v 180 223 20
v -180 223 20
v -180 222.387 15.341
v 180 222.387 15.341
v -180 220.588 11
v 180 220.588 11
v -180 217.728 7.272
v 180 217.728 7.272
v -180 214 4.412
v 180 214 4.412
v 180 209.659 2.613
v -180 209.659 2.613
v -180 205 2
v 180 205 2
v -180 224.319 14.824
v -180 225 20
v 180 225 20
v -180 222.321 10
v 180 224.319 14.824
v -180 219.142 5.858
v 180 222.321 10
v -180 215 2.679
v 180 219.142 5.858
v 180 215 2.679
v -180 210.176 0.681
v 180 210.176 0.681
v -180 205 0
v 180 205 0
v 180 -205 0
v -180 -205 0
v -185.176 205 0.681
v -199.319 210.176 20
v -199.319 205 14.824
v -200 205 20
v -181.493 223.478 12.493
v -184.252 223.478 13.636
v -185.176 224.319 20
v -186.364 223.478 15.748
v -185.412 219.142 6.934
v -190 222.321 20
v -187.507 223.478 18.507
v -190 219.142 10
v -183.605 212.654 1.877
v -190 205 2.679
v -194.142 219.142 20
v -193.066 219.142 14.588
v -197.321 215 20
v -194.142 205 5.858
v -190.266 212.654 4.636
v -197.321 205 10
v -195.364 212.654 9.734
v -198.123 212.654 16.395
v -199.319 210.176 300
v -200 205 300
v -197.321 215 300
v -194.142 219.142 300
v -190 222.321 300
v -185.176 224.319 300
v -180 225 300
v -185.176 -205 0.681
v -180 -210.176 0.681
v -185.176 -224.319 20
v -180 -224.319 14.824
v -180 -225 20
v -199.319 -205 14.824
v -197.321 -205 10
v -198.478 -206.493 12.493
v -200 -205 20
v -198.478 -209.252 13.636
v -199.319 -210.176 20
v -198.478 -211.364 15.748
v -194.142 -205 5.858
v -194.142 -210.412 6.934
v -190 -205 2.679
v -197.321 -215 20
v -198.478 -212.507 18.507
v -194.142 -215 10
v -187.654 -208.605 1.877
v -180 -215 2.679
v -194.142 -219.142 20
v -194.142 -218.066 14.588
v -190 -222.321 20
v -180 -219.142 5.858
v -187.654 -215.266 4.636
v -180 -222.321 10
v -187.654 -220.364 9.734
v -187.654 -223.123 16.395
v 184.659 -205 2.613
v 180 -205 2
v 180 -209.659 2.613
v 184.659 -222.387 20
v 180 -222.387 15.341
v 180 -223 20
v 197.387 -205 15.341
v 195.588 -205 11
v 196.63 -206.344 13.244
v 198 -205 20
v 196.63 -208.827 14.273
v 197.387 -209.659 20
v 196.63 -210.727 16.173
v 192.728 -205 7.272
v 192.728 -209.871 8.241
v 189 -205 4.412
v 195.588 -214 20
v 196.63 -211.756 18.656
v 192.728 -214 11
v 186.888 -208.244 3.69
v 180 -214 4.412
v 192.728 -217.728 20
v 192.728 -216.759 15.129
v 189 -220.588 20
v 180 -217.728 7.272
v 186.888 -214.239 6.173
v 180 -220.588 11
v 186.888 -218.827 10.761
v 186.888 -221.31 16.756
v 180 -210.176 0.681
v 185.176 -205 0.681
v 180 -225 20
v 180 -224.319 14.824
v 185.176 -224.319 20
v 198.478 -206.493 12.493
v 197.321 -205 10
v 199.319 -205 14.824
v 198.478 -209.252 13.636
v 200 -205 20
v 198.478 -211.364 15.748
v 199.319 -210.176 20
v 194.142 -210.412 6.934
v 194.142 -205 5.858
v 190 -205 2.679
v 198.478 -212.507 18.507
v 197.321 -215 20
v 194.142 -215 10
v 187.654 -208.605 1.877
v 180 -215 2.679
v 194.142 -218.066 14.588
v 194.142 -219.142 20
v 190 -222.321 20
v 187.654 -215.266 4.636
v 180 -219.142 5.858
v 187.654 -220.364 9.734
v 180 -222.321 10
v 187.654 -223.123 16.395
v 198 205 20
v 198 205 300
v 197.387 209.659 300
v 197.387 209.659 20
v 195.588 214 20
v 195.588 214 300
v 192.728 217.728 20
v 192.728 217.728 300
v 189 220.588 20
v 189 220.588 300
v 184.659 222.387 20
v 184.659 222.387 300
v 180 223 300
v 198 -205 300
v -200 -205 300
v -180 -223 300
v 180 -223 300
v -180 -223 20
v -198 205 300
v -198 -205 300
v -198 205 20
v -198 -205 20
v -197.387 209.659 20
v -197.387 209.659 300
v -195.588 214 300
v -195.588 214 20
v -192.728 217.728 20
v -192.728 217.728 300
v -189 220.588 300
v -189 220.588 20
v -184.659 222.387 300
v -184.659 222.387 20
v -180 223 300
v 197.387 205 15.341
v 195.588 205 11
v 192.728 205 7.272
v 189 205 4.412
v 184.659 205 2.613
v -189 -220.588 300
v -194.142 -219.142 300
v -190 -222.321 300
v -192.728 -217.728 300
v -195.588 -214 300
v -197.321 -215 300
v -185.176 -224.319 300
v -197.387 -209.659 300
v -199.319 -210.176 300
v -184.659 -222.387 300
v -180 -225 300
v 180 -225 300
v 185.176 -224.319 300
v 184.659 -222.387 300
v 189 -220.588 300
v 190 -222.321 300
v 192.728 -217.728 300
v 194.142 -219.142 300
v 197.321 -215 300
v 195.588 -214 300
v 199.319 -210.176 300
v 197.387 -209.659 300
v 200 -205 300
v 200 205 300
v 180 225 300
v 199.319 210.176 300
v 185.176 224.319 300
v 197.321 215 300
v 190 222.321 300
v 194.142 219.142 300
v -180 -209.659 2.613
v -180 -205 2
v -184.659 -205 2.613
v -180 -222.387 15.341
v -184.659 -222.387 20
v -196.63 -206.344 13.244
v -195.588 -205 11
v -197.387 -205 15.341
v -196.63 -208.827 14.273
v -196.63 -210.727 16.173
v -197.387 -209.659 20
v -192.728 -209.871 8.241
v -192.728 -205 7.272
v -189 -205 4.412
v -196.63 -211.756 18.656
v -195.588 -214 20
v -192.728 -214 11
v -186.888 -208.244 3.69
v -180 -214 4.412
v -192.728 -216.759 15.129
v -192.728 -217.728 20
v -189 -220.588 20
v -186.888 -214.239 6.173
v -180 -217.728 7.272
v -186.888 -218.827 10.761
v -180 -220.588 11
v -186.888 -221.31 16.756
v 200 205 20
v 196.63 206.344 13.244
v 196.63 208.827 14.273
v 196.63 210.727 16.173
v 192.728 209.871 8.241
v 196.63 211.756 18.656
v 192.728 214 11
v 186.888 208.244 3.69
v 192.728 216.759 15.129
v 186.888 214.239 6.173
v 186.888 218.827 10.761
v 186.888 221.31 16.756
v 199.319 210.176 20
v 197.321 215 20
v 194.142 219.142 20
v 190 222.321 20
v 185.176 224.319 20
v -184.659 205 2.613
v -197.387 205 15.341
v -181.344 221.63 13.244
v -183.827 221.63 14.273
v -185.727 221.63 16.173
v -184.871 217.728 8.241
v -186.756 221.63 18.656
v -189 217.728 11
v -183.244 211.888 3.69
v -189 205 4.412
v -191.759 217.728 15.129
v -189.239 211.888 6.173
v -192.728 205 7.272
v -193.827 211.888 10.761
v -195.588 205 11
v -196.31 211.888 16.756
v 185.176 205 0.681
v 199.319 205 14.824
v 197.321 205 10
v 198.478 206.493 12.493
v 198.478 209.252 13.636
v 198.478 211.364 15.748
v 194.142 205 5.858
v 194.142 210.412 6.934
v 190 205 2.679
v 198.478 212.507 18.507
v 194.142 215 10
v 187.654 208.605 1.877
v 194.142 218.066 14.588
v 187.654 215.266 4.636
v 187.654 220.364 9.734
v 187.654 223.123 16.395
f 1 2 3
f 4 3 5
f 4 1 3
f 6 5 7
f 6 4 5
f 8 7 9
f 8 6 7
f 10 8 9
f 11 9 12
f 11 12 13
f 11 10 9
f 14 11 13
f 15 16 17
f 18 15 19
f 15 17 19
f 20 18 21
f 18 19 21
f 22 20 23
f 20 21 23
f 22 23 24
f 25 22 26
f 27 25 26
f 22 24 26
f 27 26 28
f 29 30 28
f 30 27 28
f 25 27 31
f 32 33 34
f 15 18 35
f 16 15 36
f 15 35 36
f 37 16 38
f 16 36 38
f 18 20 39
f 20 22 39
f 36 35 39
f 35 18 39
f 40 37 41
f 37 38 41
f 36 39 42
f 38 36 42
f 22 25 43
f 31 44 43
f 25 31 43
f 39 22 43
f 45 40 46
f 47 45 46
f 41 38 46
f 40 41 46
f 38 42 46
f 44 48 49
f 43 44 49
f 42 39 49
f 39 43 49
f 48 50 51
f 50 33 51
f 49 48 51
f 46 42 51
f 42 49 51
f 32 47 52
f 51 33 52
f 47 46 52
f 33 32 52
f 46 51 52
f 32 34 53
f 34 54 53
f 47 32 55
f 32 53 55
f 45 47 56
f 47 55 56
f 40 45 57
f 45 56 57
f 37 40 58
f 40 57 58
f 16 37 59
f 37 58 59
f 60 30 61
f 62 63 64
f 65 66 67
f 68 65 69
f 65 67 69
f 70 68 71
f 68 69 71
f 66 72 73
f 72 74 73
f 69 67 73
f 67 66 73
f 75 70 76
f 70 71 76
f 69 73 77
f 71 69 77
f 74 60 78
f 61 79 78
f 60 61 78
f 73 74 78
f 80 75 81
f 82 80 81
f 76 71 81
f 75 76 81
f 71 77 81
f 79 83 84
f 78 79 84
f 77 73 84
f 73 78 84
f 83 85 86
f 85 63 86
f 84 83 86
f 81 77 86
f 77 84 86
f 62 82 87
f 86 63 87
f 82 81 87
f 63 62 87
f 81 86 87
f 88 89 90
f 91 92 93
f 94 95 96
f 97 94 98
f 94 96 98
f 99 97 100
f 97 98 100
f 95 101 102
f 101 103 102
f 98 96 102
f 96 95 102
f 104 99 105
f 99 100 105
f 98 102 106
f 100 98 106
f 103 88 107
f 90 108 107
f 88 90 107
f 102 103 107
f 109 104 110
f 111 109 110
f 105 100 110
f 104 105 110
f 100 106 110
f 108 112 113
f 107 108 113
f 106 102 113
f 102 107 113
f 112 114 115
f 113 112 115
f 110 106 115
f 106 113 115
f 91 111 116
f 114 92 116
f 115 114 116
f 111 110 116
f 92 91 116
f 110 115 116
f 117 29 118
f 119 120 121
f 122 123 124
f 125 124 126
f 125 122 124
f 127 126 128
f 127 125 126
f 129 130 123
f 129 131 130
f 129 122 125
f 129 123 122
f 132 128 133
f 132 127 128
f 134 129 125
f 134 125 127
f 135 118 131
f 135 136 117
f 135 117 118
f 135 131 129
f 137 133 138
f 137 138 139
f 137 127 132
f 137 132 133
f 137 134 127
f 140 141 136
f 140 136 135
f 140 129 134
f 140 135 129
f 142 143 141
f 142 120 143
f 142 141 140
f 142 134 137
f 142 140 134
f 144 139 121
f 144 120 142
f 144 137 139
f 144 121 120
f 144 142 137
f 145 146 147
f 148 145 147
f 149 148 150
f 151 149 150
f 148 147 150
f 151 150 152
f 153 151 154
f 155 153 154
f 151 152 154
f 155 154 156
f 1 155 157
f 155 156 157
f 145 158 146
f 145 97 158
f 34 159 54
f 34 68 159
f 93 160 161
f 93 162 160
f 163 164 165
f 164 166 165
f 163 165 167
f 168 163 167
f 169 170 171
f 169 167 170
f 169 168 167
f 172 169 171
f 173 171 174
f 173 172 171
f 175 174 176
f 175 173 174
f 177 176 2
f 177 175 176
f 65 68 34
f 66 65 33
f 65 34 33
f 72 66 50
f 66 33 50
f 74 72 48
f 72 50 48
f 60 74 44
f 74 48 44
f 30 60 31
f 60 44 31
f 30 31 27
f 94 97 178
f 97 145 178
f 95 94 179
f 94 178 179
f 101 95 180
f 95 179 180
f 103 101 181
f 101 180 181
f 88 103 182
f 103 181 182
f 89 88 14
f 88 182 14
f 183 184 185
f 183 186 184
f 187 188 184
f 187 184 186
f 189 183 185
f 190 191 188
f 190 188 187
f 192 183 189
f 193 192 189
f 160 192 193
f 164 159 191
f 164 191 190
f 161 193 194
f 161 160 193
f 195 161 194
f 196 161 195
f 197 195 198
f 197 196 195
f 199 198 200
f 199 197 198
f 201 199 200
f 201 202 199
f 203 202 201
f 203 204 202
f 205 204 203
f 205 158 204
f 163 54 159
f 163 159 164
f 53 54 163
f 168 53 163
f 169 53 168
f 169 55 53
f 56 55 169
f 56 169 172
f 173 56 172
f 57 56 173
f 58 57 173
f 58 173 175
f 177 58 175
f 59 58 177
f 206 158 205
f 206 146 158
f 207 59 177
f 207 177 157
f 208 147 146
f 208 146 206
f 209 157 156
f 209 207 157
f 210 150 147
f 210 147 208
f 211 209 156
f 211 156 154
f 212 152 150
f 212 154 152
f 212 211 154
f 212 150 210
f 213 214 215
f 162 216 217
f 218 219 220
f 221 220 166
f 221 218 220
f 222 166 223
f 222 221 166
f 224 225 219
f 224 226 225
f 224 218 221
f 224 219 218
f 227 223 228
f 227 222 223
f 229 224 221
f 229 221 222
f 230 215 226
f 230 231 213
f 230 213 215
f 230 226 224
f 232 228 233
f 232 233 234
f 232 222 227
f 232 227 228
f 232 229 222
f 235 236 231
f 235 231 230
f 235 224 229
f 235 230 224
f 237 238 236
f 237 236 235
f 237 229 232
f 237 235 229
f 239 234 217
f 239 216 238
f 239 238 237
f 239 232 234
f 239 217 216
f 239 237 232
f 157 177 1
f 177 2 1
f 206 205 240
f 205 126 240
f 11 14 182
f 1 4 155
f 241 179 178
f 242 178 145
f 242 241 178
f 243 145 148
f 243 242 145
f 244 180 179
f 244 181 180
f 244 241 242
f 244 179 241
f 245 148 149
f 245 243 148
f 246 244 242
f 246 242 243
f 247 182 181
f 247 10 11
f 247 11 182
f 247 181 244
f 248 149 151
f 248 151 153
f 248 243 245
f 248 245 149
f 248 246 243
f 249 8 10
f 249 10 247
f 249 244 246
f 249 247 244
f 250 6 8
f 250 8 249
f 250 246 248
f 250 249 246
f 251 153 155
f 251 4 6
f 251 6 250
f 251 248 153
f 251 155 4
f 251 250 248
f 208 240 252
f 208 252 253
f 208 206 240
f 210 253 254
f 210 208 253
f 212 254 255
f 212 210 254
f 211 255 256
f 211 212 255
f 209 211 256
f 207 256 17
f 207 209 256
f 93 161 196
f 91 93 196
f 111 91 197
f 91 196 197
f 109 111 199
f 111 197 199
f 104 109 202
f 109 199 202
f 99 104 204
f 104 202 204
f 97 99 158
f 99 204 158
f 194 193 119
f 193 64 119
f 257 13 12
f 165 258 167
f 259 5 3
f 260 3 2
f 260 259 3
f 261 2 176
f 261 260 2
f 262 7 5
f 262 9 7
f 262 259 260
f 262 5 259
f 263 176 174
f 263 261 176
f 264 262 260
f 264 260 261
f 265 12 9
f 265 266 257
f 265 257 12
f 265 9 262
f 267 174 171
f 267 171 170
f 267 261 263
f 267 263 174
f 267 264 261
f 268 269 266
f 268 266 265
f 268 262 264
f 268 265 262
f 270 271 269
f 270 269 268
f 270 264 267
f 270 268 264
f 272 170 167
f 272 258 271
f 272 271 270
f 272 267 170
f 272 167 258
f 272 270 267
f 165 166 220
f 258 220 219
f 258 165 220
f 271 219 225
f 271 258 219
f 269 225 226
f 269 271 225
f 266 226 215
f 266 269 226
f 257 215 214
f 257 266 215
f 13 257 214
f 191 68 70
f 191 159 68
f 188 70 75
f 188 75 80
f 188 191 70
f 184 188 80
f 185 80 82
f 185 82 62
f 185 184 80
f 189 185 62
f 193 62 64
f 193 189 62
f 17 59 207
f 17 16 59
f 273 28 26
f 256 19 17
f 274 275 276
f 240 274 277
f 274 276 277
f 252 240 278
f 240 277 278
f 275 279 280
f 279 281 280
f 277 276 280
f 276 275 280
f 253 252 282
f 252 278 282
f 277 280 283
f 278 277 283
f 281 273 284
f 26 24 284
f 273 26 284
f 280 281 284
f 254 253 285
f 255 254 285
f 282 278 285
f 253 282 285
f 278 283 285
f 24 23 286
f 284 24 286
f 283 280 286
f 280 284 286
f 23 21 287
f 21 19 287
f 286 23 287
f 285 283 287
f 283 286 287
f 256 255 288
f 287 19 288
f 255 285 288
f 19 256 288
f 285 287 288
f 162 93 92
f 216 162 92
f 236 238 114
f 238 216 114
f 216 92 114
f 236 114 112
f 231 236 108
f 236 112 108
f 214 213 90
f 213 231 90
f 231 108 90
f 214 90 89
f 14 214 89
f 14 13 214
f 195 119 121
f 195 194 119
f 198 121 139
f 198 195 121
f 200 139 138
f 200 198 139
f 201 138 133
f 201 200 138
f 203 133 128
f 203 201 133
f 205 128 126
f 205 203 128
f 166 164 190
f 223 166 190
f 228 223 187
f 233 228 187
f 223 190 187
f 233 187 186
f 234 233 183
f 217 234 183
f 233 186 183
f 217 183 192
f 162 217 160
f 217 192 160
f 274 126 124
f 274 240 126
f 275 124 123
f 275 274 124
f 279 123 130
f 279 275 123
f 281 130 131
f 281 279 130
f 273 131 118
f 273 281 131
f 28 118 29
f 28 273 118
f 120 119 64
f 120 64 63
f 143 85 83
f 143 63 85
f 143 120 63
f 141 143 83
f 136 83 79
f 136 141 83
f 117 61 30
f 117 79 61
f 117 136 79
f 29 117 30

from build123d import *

# Parameters (mm, degrees)
SKIZZE1_W                       = 400
SKIZZE1_H                       = 450
AUFSATZ_LINEAR_AUSTRAGEN1_DEPTH = 300
VERRUNDUNG2_R                   = 20
WANDUNG1_T                      = -2


with BuildPart() as part:
    # Skizze1 → Aufsatz-Linear austragen1 (new body)
    with BuildSketch(Plane.XY):
        Rectangle(SKIZZE1_W, SKIZZE1_H)
    extrude(amount=AUFSATZ_LINEAR_AUSTRAGEN1_DEPTH)

    # Verrundung2
    verrundung2_edges = [part.edges().sort_by_distance(p)[0] for p in [
        (0, -225, 0),
        (-200, 0, 0),
        (0, 225, 0),
        (200, 0, 0),
        (200, -225, 150),
        (-200, -225, 150),
        (-200, 225, 150),
        (200, 225, 150),
    ]]
    fillet(verrundung2_edges, radius=VERRUNDUNG2_R)

    # Wandung1
    wandung1_openings = [part.faces().sort_by_distance(p)[0] for p in [
        (0, 0, 300),
    ]]
    offset(amount=WANDUNG1_T, openings=wandung1_openings, kind=Kind.INTERSECTION)


solid = part.part
